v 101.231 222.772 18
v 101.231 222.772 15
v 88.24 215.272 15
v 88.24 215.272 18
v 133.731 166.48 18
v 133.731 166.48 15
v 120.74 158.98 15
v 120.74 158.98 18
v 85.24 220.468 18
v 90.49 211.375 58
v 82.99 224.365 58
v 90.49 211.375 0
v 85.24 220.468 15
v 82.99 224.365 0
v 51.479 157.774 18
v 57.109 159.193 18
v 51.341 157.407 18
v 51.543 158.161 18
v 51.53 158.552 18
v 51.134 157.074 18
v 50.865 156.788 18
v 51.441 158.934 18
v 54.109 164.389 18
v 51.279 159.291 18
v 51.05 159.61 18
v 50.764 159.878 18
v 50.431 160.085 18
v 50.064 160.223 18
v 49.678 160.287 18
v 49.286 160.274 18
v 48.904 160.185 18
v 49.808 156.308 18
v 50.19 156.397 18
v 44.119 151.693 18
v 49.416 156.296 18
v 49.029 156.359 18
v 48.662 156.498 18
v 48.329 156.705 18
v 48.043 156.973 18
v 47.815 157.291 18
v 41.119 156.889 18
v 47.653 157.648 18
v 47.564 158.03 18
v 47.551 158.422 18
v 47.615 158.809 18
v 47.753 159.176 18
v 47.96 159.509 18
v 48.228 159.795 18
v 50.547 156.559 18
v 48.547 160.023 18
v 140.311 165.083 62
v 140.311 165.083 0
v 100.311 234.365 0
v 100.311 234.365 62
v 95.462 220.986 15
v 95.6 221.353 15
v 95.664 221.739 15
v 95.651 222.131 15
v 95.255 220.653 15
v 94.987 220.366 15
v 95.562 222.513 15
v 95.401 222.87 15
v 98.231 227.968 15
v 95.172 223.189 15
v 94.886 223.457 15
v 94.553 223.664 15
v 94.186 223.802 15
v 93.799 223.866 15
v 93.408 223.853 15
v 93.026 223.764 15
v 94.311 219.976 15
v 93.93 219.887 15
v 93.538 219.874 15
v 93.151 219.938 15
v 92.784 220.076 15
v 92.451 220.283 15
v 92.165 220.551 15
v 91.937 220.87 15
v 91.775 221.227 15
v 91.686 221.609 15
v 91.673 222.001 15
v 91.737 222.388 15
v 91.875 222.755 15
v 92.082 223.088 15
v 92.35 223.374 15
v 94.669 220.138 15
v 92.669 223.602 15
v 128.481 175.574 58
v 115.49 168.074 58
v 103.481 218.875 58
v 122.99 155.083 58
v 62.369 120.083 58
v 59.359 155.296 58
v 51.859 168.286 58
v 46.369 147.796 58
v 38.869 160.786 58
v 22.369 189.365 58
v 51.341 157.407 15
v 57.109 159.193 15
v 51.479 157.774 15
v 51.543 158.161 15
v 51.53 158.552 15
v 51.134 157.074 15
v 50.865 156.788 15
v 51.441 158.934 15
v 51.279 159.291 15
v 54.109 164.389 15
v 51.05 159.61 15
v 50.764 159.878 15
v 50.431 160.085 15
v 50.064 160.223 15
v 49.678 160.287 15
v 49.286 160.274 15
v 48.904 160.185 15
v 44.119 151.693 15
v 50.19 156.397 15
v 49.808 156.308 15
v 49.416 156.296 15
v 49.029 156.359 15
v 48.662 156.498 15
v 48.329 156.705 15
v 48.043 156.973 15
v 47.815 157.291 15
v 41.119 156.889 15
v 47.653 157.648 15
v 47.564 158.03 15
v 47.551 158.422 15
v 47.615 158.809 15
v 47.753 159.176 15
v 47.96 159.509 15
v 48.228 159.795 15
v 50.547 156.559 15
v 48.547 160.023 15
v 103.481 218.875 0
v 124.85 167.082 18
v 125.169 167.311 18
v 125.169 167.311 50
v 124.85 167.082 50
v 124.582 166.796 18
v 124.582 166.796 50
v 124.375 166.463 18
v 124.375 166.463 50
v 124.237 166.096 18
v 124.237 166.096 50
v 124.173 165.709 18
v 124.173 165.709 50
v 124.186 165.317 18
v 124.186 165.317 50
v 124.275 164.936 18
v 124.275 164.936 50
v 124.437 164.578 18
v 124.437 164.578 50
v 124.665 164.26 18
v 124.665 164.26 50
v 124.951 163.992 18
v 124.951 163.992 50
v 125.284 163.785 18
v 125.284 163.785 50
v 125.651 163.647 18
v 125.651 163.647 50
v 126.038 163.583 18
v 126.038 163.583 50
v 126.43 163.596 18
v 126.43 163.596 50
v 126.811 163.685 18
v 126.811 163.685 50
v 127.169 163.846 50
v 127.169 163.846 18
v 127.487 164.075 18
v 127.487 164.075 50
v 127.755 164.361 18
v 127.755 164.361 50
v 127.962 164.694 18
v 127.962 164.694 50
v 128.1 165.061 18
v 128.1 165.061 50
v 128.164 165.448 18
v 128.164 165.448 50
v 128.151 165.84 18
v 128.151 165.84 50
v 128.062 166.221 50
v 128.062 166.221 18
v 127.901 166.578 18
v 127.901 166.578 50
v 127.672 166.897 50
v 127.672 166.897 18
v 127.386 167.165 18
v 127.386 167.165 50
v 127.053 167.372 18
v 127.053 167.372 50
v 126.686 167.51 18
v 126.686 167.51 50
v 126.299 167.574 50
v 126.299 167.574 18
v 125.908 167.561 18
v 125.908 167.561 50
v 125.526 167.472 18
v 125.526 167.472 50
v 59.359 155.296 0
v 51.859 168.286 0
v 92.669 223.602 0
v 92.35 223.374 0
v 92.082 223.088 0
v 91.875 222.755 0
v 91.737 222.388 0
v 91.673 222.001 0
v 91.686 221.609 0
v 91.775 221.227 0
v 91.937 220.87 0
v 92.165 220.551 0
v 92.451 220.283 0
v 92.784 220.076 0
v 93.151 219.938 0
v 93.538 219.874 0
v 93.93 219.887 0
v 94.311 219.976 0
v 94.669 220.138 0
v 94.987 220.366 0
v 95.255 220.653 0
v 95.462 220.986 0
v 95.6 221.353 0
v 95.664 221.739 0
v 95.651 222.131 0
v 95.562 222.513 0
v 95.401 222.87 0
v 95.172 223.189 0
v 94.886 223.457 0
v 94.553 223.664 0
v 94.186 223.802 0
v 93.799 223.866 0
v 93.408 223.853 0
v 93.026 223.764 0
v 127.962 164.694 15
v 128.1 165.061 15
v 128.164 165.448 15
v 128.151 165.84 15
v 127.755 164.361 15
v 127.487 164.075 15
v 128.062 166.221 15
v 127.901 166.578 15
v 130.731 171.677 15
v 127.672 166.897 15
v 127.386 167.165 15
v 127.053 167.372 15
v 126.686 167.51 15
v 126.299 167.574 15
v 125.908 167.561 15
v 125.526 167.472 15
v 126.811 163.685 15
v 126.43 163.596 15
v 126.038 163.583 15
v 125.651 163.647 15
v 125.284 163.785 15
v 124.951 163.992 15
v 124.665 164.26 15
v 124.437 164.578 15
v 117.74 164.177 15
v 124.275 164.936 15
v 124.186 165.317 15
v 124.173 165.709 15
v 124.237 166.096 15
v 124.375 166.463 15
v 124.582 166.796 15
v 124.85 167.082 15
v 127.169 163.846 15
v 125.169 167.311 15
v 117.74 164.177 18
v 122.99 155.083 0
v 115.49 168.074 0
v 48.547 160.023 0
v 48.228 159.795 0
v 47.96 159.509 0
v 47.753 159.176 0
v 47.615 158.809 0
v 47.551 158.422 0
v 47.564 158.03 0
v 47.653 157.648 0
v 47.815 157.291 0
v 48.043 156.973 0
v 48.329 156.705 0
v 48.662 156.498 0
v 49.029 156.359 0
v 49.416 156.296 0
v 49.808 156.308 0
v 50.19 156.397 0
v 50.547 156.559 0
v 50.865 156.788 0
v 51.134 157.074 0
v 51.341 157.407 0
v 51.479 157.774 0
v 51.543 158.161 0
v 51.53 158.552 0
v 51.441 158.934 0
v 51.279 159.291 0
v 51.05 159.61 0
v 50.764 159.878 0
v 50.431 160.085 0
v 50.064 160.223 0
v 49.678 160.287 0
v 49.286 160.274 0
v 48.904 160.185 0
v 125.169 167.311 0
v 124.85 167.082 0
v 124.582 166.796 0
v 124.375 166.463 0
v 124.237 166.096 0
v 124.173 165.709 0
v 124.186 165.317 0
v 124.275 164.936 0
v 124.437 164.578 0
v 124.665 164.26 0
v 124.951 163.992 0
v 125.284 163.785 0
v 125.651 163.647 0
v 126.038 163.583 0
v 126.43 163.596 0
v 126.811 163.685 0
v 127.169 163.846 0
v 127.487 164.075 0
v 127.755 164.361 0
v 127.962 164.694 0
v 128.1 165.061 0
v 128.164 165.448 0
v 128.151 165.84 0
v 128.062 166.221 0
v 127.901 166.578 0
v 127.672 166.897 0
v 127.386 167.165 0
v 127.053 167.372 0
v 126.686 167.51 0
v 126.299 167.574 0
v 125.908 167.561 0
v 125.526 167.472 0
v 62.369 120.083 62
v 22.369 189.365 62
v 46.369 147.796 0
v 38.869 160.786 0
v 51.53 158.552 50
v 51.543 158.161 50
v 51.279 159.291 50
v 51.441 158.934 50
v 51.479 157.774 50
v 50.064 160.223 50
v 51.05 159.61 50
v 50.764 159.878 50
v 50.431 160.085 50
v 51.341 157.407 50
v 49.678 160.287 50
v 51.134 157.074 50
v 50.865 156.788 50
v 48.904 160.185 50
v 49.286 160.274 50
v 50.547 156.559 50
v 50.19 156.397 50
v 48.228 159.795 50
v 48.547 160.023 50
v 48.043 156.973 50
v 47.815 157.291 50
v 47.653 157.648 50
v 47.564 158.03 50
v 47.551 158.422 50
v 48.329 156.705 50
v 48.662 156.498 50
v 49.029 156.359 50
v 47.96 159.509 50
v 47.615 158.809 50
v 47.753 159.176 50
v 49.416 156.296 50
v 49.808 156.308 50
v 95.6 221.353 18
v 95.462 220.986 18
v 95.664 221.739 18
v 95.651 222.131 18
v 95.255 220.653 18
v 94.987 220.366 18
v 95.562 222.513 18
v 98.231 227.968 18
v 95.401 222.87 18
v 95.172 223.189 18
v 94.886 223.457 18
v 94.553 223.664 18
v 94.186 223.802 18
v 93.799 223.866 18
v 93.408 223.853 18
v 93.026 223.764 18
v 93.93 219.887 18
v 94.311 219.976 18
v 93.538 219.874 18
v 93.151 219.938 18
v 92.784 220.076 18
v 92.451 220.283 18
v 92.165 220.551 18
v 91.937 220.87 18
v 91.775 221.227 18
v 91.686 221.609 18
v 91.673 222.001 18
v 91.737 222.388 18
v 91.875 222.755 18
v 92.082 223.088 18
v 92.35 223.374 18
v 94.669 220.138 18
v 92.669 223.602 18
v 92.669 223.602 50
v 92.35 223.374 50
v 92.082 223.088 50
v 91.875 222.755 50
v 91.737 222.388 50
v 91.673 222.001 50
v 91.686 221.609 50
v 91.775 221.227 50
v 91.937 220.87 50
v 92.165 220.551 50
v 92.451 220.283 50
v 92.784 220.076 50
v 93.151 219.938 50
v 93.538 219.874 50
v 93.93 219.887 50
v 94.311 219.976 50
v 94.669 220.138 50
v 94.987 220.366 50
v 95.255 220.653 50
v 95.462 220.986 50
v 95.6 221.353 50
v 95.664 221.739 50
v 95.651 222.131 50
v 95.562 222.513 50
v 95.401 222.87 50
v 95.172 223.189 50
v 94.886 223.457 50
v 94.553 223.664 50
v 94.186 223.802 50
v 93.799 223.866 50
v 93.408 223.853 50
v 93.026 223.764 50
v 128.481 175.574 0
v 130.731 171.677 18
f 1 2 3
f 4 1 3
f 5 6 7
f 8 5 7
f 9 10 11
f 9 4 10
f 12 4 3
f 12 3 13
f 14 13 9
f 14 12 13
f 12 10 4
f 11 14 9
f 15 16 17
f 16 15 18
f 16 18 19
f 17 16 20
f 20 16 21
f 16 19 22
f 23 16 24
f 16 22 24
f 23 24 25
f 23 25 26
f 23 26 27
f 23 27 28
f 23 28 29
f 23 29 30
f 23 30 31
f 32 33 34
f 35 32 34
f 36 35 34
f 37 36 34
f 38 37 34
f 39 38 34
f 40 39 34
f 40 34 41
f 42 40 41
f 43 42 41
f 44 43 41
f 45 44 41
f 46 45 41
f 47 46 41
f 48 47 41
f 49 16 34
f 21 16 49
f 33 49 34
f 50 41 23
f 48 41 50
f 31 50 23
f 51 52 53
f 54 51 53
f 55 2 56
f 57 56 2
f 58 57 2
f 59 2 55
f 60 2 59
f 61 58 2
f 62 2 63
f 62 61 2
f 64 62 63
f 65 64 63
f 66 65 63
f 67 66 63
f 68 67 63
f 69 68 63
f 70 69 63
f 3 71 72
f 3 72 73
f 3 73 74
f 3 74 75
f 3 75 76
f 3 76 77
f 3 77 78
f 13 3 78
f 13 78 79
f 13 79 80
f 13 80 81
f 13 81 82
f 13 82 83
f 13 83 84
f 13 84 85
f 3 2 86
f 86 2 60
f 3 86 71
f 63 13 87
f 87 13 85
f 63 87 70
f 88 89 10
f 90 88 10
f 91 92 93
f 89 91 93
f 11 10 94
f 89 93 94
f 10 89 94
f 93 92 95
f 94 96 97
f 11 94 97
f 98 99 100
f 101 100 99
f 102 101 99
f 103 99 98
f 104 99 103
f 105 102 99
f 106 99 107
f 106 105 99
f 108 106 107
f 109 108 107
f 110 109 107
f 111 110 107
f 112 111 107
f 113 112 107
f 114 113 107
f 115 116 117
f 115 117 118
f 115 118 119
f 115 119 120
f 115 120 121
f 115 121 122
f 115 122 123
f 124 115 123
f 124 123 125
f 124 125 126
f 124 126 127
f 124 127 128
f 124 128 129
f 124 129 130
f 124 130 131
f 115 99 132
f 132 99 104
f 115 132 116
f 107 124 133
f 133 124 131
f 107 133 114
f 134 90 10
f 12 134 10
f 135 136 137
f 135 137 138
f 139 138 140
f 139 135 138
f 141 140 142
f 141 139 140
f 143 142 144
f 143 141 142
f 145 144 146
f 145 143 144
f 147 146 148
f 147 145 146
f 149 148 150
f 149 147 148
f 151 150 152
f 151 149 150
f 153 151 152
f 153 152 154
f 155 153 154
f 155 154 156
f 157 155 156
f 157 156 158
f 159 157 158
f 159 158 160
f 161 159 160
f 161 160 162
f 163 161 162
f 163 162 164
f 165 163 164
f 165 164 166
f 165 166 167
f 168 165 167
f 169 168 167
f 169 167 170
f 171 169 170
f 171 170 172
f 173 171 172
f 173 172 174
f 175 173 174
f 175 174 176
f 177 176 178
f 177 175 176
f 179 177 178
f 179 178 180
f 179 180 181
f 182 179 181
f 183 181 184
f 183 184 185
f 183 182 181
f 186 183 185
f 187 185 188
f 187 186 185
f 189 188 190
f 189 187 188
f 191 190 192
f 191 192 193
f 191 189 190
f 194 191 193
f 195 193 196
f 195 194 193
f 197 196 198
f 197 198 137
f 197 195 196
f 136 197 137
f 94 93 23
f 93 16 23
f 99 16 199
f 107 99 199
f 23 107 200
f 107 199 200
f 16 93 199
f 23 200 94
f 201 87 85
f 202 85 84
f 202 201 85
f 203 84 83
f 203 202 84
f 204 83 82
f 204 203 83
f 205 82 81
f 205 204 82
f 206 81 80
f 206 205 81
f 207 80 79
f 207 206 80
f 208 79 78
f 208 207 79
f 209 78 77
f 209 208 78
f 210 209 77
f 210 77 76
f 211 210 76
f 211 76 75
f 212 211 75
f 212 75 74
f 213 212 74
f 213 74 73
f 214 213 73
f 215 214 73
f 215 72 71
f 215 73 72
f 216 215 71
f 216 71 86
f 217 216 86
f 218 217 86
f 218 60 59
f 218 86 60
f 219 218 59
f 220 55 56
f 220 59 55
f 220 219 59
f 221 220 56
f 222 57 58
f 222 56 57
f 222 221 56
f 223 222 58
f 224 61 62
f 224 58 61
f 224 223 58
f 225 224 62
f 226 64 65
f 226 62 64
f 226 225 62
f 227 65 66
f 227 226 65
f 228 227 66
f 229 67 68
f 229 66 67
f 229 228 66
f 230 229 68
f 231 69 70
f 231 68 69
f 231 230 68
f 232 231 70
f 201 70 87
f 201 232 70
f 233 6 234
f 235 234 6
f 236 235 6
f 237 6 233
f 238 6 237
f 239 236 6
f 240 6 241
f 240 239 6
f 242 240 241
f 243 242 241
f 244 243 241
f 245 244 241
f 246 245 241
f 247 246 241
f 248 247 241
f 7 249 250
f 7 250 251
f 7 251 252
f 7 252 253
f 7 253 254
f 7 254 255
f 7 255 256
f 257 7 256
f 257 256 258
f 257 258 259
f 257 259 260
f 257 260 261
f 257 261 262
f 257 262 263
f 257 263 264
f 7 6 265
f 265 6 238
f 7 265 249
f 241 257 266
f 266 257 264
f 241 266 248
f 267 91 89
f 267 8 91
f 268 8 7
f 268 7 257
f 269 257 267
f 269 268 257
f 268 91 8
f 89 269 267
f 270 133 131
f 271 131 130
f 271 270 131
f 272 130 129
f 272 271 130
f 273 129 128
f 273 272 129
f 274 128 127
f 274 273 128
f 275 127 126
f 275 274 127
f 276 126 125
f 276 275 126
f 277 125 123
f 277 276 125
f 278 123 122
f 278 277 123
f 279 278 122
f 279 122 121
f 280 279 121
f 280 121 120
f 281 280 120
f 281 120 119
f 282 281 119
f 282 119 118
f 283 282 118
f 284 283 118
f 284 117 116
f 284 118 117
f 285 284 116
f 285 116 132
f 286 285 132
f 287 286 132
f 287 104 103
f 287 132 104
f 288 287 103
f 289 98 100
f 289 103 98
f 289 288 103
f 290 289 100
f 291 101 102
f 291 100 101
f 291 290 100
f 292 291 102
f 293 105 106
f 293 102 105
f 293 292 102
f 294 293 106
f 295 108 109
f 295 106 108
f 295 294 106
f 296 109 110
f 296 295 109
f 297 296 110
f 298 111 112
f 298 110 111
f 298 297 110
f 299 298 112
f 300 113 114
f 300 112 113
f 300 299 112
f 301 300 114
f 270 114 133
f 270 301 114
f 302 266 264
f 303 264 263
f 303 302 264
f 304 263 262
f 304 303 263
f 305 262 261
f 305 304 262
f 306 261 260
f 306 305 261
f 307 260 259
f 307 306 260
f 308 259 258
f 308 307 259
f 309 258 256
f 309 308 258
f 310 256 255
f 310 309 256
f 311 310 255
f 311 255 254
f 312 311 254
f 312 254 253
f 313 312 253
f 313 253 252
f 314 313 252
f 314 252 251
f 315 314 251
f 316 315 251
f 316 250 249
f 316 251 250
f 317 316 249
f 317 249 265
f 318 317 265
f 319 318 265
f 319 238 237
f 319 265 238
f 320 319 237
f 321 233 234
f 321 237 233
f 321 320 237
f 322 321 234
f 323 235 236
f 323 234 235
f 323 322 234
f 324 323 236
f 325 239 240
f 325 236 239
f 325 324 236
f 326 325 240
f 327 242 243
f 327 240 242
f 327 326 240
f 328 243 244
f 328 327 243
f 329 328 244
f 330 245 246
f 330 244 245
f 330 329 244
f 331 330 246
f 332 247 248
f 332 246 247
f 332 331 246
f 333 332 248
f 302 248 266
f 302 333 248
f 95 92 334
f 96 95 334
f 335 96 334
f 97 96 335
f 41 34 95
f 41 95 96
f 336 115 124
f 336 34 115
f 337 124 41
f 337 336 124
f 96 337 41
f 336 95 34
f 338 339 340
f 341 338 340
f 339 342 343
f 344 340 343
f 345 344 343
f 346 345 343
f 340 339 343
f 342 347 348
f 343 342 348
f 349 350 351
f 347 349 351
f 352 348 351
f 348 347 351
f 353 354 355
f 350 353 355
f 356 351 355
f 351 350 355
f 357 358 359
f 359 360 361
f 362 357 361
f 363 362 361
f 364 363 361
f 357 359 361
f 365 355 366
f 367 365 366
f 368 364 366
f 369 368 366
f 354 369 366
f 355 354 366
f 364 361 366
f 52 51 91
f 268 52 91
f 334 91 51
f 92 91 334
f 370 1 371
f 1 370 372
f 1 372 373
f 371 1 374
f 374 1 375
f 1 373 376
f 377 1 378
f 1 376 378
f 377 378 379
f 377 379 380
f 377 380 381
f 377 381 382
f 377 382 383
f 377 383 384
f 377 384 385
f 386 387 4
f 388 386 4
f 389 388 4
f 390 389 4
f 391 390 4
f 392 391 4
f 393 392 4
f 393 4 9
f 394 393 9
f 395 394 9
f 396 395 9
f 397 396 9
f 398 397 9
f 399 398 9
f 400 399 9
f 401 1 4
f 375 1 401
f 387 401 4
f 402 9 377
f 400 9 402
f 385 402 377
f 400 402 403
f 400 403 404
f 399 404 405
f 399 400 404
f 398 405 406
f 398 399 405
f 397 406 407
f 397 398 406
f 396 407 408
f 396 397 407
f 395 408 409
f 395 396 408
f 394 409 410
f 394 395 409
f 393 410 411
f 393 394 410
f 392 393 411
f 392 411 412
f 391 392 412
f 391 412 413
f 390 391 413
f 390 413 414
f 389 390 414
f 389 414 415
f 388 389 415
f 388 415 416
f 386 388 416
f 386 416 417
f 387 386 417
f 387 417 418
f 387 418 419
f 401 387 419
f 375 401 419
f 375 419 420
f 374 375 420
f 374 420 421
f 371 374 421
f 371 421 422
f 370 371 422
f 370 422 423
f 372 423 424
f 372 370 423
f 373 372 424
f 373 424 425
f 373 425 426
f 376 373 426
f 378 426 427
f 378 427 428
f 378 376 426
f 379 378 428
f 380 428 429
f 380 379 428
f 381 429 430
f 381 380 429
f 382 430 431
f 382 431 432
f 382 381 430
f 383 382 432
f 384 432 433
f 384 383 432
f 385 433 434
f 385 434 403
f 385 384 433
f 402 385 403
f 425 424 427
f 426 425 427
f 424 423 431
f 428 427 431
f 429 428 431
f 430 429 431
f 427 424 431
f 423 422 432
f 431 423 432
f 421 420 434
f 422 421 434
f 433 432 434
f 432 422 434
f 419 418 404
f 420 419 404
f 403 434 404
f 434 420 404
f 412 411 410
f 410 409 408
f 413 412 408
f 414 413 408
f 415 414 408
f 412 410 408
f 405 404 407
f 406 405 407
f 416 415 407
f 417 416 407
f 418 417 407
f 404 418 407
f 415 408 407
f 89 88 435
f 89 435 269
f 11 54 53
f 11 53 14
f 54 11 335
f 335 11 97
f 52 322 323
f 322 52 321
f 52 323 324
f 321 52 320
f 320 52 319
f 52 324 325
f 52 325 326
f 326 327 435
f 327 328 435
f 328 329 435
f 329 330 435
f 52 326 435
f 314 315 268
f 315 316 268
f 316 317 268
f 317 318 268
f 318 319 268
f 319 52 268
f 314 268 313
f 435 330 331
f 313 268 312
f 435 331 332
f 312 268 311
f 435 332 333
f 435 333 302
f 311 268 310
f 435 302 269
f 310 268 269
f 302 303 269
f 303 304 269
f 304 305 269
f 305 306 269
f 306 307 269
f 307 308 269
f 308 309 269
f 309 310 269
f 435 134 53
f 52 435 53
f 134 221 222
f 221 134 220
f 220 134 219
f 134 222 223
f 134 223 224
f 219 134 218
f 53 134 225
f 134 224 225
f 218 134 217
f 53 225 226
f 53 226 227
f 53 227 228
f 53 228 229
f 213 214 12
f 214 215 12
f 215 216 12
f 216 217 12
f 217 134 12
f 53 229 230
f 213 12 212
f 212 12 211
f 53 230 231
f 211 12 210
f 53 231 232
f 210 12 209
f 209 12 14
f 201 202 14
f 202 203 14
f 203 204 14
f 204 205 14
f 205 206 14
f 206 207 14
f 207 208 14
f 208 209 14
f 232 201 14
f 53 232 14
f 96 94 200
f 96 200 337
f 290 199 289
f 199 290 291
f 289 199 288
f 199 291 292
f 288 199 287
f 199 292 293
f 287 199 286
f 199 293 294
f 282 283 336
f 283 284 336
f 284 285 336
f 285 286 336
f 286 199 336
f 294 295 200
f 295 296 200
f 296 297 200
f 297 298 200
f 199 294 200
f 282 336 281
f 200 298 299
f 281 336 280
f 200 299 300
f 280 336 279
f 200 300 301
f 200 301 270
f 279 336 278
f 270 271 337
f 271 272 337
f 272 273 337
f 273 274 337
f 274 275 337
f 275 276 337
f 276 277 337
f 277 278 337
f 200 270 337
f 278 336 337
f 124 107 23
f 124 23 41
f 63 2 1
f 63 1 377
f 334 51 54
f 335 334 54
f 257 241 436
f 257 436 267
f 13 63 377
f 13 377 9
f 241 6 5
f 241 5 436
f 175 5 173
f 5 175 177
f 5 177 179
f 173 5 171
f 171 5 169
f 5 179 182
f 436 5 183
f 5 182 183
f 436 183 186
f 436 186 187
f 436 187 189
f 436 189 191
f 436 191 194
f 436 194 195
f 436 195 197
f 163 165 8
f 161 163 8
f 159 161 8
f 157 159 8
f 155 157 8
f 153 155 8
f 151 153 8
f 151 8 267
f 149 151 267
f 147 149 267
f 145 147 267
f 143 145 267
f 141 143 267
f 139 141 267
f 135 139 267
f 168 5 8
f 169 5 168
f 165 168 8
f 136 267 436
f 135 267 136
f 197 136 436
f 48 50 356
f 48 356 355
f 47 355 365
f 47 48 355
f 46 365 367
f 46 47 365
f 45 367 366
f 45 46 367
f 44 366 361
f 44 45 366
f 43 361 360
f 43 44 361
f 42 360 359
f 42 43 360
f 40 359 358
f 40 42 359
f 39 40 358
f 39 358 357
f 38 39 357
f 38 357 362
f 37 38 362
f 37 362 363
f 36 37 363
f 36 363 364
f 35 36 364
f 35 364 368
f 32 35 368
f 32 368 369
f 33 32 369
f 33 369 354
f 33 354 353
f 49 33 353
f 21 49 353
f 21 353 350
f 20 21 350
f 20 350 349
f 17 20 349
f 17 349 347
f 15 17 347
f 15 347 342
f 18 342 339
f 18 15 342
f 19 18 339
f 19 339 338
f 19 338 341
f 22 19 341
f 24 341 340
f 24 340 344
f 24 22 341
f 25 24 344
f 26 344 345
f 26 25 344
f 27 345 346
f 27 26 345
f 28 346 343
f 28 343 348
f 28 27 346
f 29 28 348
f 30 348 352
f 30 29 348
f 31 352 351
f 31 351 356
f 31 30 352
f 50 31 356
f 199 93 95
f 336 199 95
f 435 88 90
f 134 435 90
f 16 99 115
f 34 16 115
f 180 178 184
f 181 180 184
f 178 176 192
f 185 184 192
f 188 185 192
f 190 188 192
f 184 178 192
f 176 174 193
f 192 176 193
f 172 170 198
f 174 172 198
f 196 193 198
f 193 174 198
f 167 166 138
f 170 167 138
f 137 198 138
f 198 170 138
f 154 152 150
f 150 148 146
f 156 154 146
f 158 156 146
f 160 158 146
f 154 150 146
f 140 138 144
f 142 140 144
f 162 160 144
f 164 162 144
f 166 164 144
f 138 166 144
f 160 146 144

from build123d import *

# Parameters (mm, degrees)
BOX035_W                 = 6
BOX035_H                 = 15
BOX035_DEPTH             = 3
CYLINDER018_R            = 2
CYLINDER018_DEPTH        = 50
BOX_W                    = 15
BOX_H                    = 15
BOX_DEPTH                = 58
BOX038_W                 = 80
BOX038_H                 = 5
BOX038_DEPTH             = 58
BOX039_W                 = 80
BOX039_H                 = 90
BOX039_DEPTH             = 4
CLONE002_PLACEMENT_ANGLE = 120


with BuildPart() as nut_hole:
    # Box035 → Box035 (new body)
    with BuildSketch(Plane(origin=(-8.5, 5, 15), x_dir=(1, 0, 0), z_dir=(0, 0, 1))):
        with Locations((3, 7.5)):
            Rectangle(BOX035_W, BOX035_H)
    extrude(amount=BOX035_DEPTH)


with BuildPart() as cylinder:
    # Cylinder018 → Cylinder018 (new body)
    with BuildSketch(Plane(origin=(-5.5, 12, 0), x_dir=(1, 0, 0), z_dir=(0, 0, 1))):
        Circle(CYLINDER018_R)
    extrude(amount=CYLINDER018_DEPTH)


with BuildPart() as cut:
    # Box → Box (new body)
    with BuildSketch(Plane(origin=(-13, 5, 0), x_dir=(1, 0, 0), z_dir=(0, 0, 1))):
        with Locations((7.5, 7.5)):
            Rectangle(BOX_W, BOX_H)
    extrude(amount=BOX_DEPTH)

    # Cut: cut Cylinder
    add(cylinder.part, mode=Mode.SUBTRACT)


with BuildPart() as cut037:
    # Cut037 base: copy of Cut
    add(cut.part)

    # Cut037: cut Nut hole
    add(nut_hole.part, mode=Mode.SUBTRACT)


with BuildPart() as cut037_1:
    # Cut037 placement: moved
    add(cut037.part.moved(Location((-22, 0, 0))))


with BuildPart() as cut038:
    # Cut038 base: copy of Cut
    add(cut.part)

    # Cut038: cut Nut hole
    add(nut_hole.part, mode=Mode.SUBTRACT)


with BuildPart() as cut038_1:
    # Cut038 placement: moved
    add(cut038.part.moved(Location((43, 0, 0))))


with BuildPart() as extension_supports:
    # Cut039 base: copy of Cut
    add(cut.part)

    # Cut039: cut Nut hole
    add(nut_hole.part, mode=Mode.SUBTRACT)


with BuildPart() as extension_supports_1:
    # Cut039 placement: moved
    add(extension_supports.part.moved(Location((10, 70, 0))))

    # Fusion082: union Cut037, Cut038
    add(cut037_1.part)
    add(cut038_1.part)


with BuildPart() as cube002:
    # Box038 → Box038 (new body)
    with BuildSketch(Plane(origin=(-35, 0, 0), x_dir=(1, 0, 0), z_dir=(0, 0, 1))):
        with Locations((40, 2.5)):
            Rectangle(BOX038_W, BOX038_H)
    extrude(amount=BOX038_DEPTH)


with BuildPart() as clone002:
    # Box039 → Box039 (new body)
    with BuildSketch(Plane(origin=(-35, 0, 58), x_dir=(1, 0, 0), z_dir=(0, 0, 1))):
        with Locations((40, 45)):
            Rectangle(BOX039_W, BOX039_H)
    extrude(amount=BOX039_DEPTH)

    # Fusion081: union Cube002
    add(cube002.part)

    # Fusion084: union Extension supports
    add(extension_supports_1.part)


with BuildPart() as clone002_1:
    # Clone002 placement: moved
    add(clone002.part.moved(Location((122.810889, 195.394192, 0))).rotate(Axis((122.810889, 195.394192, 0), (0, 0, 1)), CLONE002_PLACEMENT_ANGLE))


solid = clone002_1.part
